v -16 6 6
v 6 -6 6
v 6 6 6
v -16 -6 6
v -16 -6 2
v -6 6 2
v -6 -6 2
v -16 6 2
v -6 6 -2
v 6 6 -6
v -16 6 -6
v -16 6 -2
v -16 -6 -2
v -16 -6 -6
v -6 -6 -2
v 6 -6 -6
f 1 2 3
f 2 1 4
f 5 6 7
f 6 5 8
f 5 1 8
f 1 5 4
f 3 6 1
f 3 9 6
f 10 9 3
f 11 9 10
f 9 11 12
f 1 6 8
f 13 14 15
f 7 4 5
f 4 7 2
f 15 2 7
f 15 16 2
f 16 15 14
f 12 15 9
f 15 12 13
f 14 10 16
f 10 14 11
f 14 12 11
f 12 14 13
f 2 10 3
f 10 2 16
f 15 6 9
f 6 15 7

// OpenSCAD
size = 32;//block=32 //item=8

cube([size * 0.375, size * 0.375, size * 0.375], center = true);//hand
translate([-size * 0.3125, 0, 0]) {
  translate([0, 0, size * 0.125]) {//finger top
    cube([size * 0.375, size * 0.375, size * 0.125], center = true);
  }
  ;//translate
  translate([0, 0, -size * 0.125]) {//finger bottom
    cube([size * 0.375, size * 0.375, size * 0.125], center = true);
  }
  ;//translate
}
;//translate
